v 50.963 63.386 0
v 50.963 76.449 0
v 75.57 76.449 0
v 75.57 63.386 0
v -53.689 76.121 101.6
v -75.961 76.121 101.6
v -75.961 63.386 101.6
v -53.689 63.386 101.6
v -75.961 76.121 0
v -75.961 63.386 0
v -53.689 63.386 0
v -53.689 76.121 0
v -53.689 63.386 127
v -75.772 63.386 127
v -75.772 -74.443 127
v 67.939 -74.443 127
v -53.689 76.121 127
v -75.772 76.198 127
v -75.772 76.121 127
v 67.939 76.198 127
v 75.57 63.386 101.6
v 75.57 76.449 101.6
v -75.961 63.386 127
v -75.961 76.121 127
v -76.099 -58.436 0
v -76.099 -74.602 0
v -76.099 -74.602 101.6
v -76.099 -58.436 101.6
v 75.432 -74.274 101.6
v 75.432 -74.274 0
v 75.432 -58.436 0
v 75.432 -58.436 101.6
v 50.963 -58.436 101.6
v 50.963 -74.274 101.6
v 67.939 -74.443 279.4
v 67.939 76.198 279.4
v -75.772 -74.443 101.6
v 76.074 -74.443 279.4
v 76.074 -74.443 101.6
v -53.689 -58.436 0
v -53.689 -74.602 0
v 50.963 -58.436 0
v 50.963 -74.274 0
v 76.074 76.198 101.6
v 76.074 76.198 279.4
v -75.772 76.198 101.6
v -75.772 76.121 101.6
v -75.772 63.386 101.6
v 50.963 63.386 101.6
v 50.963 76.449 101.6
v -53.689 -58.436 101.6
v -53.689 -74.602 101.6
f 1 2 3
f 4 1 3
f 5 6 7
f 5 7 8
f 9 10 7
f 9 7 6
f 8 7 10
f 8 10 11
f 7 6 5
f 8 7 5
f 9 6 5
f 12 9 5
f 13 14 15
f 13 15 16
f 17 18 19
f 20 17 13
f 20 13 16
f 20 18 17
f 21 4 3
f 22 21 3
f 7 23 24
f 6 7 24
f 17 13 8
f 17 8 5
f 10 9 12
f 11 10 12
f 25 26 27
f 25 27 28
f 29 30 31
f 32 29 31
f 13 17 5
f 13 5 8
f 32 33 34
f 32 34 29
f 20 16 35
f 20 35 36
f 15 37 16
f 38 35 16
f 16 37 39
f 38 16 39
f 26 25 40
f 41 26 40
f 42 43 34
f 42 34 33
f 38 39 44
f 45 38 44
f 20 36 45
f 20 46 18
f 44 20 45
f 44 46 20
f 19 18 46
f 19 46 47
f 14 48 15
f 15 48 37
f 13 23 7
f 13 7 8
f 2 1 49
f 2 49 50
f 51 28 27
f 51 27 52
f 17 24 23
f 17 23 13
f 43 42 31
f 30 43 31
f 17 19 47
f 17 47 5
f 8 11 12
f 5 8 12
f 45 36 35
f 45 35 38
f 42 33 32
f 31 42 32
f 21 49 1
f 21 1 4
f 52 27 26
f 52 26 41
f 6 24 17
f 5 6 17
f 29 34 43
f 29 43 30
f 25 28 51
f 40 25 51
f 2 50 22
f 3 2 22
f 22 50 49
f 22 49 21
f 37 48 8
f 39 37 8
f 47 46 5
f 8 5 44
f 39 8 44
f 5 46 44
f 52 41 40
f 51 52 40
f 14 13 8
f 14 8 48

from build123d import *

# Parameters (mm, degrees)
F0_W      = 22.2713761032
F0_H      = 12.734927237
F1_DEPTH  = 101.6
F0_W_2    = 24.6072933078
F0_H_2    = 13.0628943443
F0_W_3    = 24.4693160057
F0_H_3    = 15.8381722867
F0_W_4    = 22.4093534052
F0_H_4    = 16.1661319435
F3_DEPTH  = 25.4
F4_W      = 22.2713761032
F4_H      = 12.734927237
F5_DEPTH  = 25.4
F6_W      = 8.1346035004
F6_H      = 150.6408303976
F7_DEPTH  = 76.2
F8_DEPTH  = 152.4
F9_DEPTH  = 127
F10_DEPTH = 25.4
F11_DEPTH = 76.2
F12_DEPTH = 76.2
F13_DEPTH = 76.2


with BuildPart() as f1:
    # F0 (on Top) → F1 (new body)
    with BuildSketch(Plane.XY):
        with Locations((-64.8248959333, 69.7539411485)):
            Rectangle(F0_W, F0_H)
    extrude(amount=F1_DEPTH)


with BuildPart() as f1b:
    # F0 (on Top) → F1, piece 2 (new body)
    with BuildSketch(Plane.XY):
        with Locations((63.26655671, 69.9179247022)):
            Rectangle(F0_W_2, F0_H_2)
    extrude(amount=F1_DEPTH)


with BuildPart() as f1c:
    # F0 (on Top) → F1, piece 3 (new body)
    with BuildSketch(Plane.XY):
        with Locations((63.197568059, -66.3553122431)):
            Rectangle(F0_W_3, F0_H_3)
    extrude(amount=F1_DEPTH)


with BuildPart() as f1d:
    # F0 (on Top) → F1, piece 4 (new body)
    with BuildSketch(Plane.XY):
        with Locations((-64.8938845843, -66.5192920715)):
            Rectangle(F0_W_4, F0_H_4)
    extrude(amount=F1_DEPTH)


with BuildPart() as f3:
    # F2 (on face) → F3 (new body)
    with BuildSketch(Plane.XY.offset(101.6)):
        Polygon((-75.7723376155, 63.38647753), (-75.7723376155, -74.4425281882), (76.0736167431, -74.4425281882), (76.0736167431, 76.1983022094), (-75.7723376155, 76.1983022094), (-75.7723376155, 76.121404767), (-53.6892078817, 76.121404767), (-53.6892078817, 63.38647753), align=None)
    extrude(amount=F3_DEPTH)

    # F6 (on face) → F7 (join)
    with BuildSketch(Plane.XY.offset(127)):
        with Locations((72.0063149929, 0.8778870106)):
            Rectangle(F6_W, F6_H)
    extrude(amount=F7_DEPTH)

    # F8 (add): a face of the model
    f8_faces = [f3.faces().sort_by_distance(p)[0] for p in [
        (72.0063149929, 0.8778870106, 203.2),
    ]]
    extrude(f8_faces, amount=F8_DEPTH)

    # F9 (add): a face of the model
    f9_faces = [f3.faces().sort_by_distance(p)[0] for p in [
        (72.0063149929, 0.8778870106, 355.6),
    ]]
    extrude(f9_faces, amount=F9_DEPTH)

    # F10 (add): a face of the model
    f10_faces = [f3.faces().sort_by_distance(p)[0] for p in [
        (72.0063149929, 0.8778870106, 482.6),
    ]]
    extrude(f10_faces, amount=F10_DEPTH)

    # F11 (cut): a face of the model
    f11_faces = [f3.faces().sort_by_distance(p)[0] for p in [
        (72.0063149929, 0.8778870106, 508),
    ]]
    extrude(f11_faces, amount=-F11_DEPTH, mode=Mode.SUBTRACT)

    # F12 (cut): a face of the model
    f12_faces = [f3.faces().sort_by_distance(p)[0] for p in [
        (72.0063149929, 0.8778870106, 431.8),
    ]]
    extrude(f12_faces, amount=-F12_DEPTH, mode=Mode.SUBTRACT)

    # F13 (cut): a face of the model
    f13_faces = [f3.faces().sort_by_distance(p)[0] for p in [
        (72.0063149929, 0.8778870106, 355.6),
    ]]
    extrude(f13_faces, amount=-F13_DEPTH, mode=Mode.SUBTRACT)


with BuildPart() as f5:
    # F4 (on face) → F5 (new body)
    with BuildSketch(Plane.XY.offset(101.6)):
        with Locations((-64.8248959333, 69.7539411485)):
            Rectangle(F4_W, F4_H)
    extrude(amount=F5_DEPTH)


solid = Compound([f1.part, f1b.part, f1c.part, f1d.part, f3.part, f5.part])
